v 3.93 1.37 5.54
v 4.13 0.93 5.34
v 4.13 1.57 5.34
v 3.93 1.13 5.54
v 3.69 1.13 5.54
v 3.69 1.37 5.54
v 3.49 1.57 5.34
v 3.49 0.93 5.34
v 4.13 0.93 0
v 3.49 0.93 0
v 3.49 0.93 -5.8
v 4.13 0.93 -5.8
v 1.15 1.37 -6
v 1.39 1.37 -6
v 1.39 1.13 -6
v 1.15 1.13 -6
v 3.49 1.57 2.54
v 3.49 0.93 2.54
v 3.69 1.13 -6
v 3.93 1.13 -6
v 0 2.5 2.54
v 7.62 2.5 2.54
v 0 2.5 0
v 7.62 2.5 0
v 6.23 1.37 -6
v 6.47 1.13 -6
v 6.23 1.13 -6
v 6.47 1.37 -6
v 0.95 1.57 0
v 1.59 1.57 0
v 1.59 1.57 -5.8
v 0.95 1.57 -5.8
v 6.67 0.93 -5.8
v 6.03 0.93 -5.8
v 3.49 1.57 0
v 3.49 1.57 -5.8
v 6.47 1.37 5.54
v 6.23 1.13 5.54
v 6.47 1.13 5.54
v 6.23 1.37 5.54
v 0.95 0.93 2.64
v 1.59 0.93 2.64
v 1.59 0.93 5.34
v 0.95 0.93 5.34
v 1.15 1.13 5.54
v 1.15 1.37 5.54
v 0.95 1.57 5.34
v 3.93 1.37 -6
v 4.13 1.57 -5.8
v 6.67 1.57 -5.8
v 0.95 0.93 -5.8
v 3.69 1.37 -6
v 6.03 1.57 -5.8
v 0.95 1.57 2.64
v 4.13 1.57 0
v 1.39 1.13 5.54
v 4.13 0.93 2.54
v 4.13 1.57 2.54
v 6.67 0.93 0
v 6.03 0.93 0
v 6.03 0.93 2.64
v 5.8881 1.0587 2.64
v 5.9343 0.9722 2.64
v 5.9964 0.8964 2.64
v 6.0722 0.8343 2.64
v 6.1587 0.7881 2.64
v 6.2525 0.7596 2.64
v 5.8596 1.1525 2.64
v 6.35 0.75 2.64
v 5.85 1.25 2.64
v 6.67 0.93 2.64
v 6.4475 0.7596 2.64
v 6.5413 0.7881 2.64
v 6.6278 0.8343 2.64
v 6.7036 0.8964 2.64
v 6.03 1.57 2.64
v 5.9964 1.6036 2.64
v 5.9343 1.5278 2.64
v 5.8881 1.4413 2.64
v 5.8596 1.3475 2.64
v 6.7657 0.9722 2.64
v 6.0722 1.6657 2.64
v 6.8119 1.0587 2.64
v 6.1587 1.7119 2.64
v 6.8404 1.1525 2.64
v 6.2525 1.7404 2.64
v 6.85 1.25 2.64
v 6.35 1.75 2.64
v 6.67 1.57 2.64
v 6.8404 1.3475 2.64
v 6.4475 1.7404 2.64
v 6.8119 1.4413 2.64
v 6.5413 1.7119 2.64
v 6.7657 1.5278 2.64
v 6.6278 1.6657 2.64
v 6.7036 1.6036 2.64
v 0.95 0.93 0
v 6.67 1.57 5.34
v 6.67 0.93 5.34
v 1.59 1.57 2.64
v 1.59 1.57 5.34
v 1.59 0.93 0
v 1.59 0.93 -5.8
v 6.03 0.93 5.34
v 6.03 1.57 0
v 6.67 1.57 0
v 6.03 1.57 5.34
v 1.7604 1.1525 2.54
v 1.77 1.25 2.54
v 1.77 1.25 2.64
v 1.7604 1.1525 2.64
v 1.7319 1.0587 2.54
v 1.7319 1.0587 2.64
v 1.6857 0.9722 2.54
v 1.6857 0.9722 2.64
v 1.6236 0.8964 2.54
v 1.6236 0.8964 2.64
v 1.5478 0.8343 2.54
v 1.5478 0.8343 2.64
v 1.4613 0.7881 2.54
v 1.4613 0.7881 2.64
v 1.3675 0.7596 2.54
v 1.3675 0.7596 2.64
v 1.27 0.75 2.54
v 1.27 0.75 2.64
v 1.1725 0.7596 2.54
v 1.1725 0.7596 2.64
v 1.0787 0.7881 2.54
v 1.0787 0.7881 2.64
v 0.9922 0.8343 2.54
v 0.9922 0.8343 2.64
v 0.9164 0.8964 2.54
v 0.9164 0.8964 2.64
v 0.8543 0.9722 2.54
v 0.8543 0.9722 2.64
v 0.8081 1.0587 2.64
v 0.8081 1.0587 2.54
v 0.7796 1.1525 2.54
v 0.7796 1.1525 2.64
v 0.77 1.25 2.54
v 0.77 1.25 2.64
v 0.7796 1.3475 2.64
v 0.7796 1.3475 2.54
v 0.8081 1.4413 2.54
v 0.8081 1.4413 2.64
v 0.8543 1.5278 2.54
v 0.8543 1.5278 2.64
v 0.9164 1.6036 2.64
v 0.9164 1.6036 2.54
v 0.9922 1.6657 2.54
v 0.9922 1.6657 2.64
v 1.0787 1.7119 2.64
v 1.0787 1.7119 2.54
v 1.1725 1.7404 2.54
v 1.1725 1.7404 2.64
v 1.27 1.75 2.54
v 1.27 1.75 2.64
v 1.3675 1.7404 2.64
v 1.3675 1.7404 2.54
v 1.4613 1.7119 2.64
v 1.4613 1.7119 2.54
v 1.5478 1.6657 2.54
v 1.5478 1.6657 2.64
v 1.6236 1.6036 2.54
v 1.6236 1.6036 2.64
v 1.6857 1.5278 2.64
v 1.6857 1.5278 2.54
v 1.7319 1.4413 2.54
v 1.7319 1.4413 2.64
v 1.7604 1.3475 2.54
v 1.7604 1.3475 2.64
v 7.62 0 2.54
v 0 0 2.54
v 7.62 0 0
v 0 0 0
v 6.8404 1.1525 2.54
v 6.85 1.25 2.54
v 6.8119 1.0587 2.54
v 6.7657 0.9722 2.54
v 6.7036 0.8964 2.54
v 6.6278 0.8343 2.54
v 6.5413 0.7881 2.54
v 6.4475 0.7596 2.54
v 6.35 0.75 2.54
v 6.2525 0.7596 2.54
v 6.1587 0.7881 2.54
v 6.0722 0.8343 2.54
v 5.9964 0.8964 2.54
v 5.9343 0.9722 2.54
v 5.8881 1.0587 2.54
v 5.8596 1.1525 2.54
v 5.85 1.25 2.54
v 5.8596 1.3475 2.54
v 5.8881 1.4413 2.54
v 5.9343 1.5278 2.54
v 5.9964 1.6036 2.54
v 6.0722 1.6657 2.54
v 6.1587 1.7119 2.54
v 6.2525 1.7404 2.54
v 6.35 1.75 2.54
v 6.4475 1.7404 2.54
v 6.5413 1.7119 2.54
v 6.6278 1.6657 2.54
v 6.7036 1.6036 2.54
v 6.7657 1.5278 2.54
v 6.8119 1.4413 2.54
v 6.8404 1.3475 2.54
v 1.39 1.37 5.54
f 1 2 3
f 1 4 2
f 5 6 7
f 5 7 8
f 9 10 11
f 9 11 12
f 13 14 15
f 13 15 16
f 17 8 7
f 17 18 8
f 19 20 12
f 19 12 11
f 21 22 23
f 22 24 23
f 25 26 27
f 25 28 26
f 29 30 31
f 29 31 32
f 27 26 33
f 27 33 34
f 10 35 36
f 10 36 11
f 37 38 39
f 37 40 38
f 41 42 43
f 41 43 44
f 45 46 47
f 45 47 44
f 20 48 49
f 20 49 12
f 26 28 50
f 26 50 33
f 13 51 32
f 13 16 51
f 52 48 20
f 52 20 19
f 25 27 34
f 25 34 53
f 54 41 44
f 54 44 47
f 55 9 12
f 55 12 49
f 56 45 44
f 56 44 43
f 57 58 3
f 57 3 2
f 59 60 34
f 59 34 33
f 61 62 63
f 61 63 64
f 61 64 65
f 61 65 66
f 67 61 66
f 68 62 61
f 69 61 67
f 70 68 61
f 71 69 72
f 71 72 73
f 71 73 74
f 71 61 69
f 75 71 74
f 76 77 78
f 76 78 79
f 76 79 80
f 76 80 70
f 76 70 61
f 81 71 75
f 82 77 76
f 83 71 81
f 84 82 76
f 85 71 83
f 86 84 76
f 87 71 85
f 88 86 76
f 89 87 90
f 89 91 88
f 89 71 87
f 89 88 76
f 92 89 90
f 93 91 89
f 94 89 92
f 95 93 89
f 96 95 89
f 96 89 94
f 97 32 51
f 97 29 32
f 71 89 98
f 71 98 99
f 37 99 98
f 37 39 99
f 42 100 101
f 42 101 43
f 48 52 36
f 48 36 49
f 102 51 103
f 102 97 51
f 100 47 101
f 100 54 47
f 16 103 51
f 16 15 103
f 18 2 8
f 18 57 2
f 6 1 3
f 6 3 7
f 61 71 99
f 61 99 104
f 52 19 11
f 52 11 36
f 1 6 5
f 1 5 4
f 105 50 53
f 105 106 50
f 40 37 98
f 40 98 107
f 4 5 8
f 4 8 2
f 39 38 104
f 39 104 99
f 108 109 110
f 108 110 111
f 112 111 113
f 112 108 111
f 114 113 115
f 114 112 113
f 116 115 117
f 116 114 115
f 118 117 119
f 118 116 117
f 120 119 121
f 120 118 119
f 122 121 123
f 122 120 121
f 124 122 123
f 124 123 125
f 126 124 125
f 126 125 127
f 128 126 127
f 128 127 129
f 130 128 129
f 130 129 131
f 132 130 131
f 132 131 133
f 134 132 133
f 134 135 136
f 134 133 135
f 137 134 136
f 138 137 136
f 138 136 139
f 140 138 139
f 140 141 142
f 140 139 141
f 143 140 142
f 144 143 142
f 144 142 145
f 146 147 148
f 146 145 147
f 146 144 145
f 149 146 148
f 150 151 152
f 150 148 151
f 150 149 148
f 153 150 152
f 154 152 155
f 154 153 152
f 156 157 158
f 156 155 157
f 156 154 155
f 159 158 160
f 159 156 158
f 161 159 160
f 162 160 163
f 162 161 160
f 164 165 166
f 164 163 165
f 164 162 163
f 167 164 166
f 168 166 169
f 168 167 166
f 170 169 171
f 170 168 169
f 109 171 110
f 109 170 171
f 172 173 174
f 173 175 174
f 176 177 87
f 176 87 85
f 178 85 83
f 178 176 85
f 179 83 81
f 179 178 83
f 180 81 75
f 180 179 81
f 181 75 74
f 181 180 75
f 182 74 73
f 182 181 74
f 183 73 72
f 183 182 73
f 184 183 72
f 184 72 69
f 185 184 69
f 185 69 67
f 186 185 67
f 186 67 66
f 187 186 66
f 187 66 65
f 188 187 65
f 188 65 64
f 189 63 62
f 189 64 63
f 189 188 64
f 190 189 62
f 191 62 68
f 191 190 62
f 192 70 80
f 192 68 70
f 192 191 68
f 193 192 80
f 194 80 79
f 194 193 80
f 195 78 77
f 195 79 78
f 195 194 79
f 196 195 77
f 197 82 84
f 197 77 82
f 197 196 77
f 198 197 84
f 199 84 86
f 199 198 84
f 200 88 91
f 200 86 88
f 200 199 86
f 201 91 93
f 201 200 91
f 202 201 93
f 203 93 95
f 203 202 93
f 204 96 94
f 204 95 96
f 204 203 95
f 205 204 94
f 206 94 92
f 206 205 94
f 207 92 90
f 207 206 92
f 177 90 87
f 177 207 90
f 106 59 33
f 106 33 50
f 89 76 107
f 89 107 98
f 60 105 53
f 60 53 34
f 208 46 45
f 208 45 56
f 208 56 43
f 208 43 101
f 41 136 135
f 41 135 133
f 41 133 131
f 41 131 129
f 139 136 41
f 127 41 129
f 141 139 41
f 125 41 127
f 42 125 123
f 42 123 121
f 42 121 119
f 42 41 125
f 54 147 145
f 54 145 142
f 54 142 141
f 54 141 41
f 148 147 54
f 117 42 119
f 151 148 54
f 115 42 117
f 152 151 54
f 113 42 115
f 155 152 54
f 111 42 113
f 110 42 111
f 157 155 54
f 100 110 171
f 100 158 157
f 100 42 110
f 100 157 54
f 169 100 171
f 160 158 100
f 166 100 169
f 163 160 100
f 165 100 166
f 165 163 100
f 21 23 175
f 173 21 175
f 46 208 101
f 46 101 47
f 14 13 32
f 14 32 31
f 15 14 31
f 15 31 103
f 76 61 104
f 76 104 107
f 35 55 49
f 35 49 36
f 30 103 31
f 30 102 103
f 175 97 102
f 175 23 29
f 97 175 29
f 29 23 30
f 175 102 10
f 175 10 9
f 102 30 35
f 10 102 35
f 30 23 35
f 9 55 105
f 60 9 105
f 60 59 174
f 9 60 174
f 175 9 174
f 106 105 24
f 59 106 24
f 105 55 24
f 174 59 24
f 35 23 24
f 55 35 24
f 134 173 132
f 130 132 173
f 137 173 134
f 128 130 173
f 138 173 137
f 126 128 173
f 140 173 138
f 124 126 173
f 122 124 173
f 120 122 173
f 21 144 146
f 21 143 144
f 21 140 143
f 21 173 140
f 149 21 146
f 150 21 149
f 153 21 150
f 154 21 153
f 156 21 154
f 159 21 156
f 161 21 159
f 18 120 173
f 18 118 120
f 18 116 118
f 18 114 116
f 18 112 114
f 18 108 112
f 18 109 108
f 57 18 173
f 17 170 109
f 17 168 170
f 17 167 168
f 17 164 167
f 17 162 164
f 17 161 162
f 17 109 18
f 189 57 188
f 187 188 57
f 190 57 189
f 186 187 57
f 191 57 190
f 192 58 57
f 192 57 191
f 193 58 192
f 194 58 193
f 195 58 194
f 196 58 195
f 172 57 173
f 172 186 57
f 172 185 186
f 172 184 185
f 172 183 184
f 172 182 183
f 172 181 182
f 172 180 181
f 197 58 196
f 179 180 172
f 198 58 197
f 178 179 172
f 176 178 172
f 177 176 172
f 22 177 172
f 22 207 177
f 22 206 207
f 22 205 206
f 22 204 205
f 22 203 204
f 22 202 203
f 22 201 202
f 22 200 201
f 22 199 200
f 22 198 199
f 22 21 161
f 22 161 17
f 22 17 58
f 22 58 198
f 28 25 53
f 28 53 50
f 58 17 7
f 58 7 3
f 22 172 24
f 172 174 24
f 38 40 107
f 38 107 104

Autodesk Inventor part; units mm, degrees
ref_plane "YZ Plane" through (0, 0, 0) normal (1, 0, 0) x (0, 1, 0)
ref_plane "XZ Plane" through (0, 0, 0) normal (0, 1, 0) x (-1, 0, 0)
ref_plane "XY Plane" through (0, 0, 0) normal (0, 0, 1) x (1, 0, 0)
sketch "Sketch1" plane through (0, 0, 0) normal (0, 0, 1) x (1, 0, 0)
  line L0 (0, 0) -> (7.62, 0)
  line L1 (7.62, 0) -> (7.62, 2.5)
  line L2 (7.62, 2.5) -> (0, 2.5)
  line L3 (0, 2.5) -> (0, 0)
  dimension "d0" = 7.62
  dimension "d1" = 2.5
extrude "Extrusion1" add sketch "Sketch1" along normal blind 2.54
sketch "Sketch2" plane through (0, 0, 2.54) normal (0, 0, 1) x (1, 0, 0)
  line L0 (0.95, 1.57) -> (1.59, 1.57)
  line L1 (1.59, 1.57) -> (1.59, 0.93)
  line L2 (1.59, 0.93) -> (0.95, 0.93)
  line L3 (0.95, 0.93) -> (0.95, 1.57)
  line L4 (3.49, 1.57) -> (4.13, 1.57)
  line L5 (4.13, 1.57) -> (4.13, 0.93)
  line L6 (4.13, 0.93) -> (3.49, 0.93)
  line L7 (3.49, 0.93) -> (3.49, 1.57)
  line L8 (6.03, 1.57) -> (6.67, 1.57)
  line L9 (6.67, 1.57) -> (6.67, 0.93)
  line L10 (6.67, 0.93) -> (6.03, 0.93)
  line L11 (6.03, 0.93) -> (6.03, 1.57)
  line L12 (7.62, 2.5) -> (0, 2.5) projected
  line L13 (0, 2.5) -> (0, 0) projected
  dimension "d4" = 0.64
  dimension "d5" = 0.64
  dimension "d6" = 0.64
  dimension "d7" = 0.64
  dimension "d8" = 2.54
  dimension "d9" = 2.54
  dimension "d10" = 0.93
  dimension "d11" = 0.95
extrude "Extrusion2" add sketch "Sketch2" along normal blind 3
sketch "Sketch3" plane through (0, 0, 0) normal (0, 0, -1) x (-1, 0, 0)
  line L0 (-6.03, 0.93) -> (-6.67, 0.93) projected
  line L1 (-6.67, 0.93) -> (-6.67, 1.57) projected
  line L2 (-6.67, 1.57) -> (-6.03, 1.57) projected
  line L3 (-6.03, 1.57) -> (-6.03, 0.93) projected
  line L4 (-3.49, 0.93) -> (-4.13, 0.93) projected
  line L5 (-4.13, 0.93) -> (-4.13, 1.57) projected
  line L6 (-4.13, 1.57) -> (-3.49, 1.57) projected
  line L7 (-3.49, 1.57) -> (-3.49, 0.93) projected
  line L8 (-0.95, 0.93) -> (-1.59, 0.93) projected
  line L9 (-1.59, 0.93) -> (-1.59, 1.57) projected
  line L10 (-1.59, 1.57) -> (-0.95, 1.57) projected
  line L11 (-0.95, 1.57) -> (-0.95, 0.93) projected
  point P0 (0, 0)
extrude "Extrusion3" add sketch "Sketch3" along normal blind 6
chamfer "Chamfer1" distance 0.2 angle 45 24 edges at (1.27, 1.57, -6) (1.59, 1.25, -6) (1.27, 0.93, -6) (0.95, 1.25, -6) (3.81, 1.57, -6) (4.13, 1.25, -6) (3.81, 0.93, -6) (3.49, 1.25, -6) (6.03, 1.25, -6) (6.35, 1.57, -6) (6.67, 1.25, -6) (6.35, 0.93, -6) (6.67, 1.25, 5.54) (6.35, 1.57, 5.54) (6.03, 1.25, 5.54) (6.35, 0.93, 5.54) (4.13, 1.25, 5.54) (3.81, 0.93, 5.54) (3.49, 1.25, 5.54) (3.81, 1.57, 5.54) (1.59, 1.25, 5.54) (1.27, 0.93, 5.54) (0.95, 1.25, 5.54) (1.27, 1.57, 5.54)
sketch "Sketch4" plane through (0, 0, 2.54) normal (0, 0, 1) x (1, 0, 0)
  circle A0 centre (6.35, 1.25) radius 0.5
  circle A1 centre (1.27, 1.25) radius 0.5
  line L0 (0, 2.5) -> (0, 0) projected
  line L1 (0, 0) -> (7.62, 0) projected
  line L2 (7.62, 0) -> (7.62, 2.5) projected
  dimension "d21" = 1
  dimension "d22" = 1.27
  dimension "d23" = 1.25
  dimension "d24" = 1.25
  dimension "d25" = 1.27
extrude "Extrusion4" add sketch "Sketch4" along normal blind 0.1
equation "\"d5\" = d4"
equation "\"d6\" = d4"
equation "\"d7\" = d4"
equation "\"d9\" = d8"
equation "\"d24\" = d23"
equation "\"d25\" = d22"
properties part number "Male_Pin_1x3"
